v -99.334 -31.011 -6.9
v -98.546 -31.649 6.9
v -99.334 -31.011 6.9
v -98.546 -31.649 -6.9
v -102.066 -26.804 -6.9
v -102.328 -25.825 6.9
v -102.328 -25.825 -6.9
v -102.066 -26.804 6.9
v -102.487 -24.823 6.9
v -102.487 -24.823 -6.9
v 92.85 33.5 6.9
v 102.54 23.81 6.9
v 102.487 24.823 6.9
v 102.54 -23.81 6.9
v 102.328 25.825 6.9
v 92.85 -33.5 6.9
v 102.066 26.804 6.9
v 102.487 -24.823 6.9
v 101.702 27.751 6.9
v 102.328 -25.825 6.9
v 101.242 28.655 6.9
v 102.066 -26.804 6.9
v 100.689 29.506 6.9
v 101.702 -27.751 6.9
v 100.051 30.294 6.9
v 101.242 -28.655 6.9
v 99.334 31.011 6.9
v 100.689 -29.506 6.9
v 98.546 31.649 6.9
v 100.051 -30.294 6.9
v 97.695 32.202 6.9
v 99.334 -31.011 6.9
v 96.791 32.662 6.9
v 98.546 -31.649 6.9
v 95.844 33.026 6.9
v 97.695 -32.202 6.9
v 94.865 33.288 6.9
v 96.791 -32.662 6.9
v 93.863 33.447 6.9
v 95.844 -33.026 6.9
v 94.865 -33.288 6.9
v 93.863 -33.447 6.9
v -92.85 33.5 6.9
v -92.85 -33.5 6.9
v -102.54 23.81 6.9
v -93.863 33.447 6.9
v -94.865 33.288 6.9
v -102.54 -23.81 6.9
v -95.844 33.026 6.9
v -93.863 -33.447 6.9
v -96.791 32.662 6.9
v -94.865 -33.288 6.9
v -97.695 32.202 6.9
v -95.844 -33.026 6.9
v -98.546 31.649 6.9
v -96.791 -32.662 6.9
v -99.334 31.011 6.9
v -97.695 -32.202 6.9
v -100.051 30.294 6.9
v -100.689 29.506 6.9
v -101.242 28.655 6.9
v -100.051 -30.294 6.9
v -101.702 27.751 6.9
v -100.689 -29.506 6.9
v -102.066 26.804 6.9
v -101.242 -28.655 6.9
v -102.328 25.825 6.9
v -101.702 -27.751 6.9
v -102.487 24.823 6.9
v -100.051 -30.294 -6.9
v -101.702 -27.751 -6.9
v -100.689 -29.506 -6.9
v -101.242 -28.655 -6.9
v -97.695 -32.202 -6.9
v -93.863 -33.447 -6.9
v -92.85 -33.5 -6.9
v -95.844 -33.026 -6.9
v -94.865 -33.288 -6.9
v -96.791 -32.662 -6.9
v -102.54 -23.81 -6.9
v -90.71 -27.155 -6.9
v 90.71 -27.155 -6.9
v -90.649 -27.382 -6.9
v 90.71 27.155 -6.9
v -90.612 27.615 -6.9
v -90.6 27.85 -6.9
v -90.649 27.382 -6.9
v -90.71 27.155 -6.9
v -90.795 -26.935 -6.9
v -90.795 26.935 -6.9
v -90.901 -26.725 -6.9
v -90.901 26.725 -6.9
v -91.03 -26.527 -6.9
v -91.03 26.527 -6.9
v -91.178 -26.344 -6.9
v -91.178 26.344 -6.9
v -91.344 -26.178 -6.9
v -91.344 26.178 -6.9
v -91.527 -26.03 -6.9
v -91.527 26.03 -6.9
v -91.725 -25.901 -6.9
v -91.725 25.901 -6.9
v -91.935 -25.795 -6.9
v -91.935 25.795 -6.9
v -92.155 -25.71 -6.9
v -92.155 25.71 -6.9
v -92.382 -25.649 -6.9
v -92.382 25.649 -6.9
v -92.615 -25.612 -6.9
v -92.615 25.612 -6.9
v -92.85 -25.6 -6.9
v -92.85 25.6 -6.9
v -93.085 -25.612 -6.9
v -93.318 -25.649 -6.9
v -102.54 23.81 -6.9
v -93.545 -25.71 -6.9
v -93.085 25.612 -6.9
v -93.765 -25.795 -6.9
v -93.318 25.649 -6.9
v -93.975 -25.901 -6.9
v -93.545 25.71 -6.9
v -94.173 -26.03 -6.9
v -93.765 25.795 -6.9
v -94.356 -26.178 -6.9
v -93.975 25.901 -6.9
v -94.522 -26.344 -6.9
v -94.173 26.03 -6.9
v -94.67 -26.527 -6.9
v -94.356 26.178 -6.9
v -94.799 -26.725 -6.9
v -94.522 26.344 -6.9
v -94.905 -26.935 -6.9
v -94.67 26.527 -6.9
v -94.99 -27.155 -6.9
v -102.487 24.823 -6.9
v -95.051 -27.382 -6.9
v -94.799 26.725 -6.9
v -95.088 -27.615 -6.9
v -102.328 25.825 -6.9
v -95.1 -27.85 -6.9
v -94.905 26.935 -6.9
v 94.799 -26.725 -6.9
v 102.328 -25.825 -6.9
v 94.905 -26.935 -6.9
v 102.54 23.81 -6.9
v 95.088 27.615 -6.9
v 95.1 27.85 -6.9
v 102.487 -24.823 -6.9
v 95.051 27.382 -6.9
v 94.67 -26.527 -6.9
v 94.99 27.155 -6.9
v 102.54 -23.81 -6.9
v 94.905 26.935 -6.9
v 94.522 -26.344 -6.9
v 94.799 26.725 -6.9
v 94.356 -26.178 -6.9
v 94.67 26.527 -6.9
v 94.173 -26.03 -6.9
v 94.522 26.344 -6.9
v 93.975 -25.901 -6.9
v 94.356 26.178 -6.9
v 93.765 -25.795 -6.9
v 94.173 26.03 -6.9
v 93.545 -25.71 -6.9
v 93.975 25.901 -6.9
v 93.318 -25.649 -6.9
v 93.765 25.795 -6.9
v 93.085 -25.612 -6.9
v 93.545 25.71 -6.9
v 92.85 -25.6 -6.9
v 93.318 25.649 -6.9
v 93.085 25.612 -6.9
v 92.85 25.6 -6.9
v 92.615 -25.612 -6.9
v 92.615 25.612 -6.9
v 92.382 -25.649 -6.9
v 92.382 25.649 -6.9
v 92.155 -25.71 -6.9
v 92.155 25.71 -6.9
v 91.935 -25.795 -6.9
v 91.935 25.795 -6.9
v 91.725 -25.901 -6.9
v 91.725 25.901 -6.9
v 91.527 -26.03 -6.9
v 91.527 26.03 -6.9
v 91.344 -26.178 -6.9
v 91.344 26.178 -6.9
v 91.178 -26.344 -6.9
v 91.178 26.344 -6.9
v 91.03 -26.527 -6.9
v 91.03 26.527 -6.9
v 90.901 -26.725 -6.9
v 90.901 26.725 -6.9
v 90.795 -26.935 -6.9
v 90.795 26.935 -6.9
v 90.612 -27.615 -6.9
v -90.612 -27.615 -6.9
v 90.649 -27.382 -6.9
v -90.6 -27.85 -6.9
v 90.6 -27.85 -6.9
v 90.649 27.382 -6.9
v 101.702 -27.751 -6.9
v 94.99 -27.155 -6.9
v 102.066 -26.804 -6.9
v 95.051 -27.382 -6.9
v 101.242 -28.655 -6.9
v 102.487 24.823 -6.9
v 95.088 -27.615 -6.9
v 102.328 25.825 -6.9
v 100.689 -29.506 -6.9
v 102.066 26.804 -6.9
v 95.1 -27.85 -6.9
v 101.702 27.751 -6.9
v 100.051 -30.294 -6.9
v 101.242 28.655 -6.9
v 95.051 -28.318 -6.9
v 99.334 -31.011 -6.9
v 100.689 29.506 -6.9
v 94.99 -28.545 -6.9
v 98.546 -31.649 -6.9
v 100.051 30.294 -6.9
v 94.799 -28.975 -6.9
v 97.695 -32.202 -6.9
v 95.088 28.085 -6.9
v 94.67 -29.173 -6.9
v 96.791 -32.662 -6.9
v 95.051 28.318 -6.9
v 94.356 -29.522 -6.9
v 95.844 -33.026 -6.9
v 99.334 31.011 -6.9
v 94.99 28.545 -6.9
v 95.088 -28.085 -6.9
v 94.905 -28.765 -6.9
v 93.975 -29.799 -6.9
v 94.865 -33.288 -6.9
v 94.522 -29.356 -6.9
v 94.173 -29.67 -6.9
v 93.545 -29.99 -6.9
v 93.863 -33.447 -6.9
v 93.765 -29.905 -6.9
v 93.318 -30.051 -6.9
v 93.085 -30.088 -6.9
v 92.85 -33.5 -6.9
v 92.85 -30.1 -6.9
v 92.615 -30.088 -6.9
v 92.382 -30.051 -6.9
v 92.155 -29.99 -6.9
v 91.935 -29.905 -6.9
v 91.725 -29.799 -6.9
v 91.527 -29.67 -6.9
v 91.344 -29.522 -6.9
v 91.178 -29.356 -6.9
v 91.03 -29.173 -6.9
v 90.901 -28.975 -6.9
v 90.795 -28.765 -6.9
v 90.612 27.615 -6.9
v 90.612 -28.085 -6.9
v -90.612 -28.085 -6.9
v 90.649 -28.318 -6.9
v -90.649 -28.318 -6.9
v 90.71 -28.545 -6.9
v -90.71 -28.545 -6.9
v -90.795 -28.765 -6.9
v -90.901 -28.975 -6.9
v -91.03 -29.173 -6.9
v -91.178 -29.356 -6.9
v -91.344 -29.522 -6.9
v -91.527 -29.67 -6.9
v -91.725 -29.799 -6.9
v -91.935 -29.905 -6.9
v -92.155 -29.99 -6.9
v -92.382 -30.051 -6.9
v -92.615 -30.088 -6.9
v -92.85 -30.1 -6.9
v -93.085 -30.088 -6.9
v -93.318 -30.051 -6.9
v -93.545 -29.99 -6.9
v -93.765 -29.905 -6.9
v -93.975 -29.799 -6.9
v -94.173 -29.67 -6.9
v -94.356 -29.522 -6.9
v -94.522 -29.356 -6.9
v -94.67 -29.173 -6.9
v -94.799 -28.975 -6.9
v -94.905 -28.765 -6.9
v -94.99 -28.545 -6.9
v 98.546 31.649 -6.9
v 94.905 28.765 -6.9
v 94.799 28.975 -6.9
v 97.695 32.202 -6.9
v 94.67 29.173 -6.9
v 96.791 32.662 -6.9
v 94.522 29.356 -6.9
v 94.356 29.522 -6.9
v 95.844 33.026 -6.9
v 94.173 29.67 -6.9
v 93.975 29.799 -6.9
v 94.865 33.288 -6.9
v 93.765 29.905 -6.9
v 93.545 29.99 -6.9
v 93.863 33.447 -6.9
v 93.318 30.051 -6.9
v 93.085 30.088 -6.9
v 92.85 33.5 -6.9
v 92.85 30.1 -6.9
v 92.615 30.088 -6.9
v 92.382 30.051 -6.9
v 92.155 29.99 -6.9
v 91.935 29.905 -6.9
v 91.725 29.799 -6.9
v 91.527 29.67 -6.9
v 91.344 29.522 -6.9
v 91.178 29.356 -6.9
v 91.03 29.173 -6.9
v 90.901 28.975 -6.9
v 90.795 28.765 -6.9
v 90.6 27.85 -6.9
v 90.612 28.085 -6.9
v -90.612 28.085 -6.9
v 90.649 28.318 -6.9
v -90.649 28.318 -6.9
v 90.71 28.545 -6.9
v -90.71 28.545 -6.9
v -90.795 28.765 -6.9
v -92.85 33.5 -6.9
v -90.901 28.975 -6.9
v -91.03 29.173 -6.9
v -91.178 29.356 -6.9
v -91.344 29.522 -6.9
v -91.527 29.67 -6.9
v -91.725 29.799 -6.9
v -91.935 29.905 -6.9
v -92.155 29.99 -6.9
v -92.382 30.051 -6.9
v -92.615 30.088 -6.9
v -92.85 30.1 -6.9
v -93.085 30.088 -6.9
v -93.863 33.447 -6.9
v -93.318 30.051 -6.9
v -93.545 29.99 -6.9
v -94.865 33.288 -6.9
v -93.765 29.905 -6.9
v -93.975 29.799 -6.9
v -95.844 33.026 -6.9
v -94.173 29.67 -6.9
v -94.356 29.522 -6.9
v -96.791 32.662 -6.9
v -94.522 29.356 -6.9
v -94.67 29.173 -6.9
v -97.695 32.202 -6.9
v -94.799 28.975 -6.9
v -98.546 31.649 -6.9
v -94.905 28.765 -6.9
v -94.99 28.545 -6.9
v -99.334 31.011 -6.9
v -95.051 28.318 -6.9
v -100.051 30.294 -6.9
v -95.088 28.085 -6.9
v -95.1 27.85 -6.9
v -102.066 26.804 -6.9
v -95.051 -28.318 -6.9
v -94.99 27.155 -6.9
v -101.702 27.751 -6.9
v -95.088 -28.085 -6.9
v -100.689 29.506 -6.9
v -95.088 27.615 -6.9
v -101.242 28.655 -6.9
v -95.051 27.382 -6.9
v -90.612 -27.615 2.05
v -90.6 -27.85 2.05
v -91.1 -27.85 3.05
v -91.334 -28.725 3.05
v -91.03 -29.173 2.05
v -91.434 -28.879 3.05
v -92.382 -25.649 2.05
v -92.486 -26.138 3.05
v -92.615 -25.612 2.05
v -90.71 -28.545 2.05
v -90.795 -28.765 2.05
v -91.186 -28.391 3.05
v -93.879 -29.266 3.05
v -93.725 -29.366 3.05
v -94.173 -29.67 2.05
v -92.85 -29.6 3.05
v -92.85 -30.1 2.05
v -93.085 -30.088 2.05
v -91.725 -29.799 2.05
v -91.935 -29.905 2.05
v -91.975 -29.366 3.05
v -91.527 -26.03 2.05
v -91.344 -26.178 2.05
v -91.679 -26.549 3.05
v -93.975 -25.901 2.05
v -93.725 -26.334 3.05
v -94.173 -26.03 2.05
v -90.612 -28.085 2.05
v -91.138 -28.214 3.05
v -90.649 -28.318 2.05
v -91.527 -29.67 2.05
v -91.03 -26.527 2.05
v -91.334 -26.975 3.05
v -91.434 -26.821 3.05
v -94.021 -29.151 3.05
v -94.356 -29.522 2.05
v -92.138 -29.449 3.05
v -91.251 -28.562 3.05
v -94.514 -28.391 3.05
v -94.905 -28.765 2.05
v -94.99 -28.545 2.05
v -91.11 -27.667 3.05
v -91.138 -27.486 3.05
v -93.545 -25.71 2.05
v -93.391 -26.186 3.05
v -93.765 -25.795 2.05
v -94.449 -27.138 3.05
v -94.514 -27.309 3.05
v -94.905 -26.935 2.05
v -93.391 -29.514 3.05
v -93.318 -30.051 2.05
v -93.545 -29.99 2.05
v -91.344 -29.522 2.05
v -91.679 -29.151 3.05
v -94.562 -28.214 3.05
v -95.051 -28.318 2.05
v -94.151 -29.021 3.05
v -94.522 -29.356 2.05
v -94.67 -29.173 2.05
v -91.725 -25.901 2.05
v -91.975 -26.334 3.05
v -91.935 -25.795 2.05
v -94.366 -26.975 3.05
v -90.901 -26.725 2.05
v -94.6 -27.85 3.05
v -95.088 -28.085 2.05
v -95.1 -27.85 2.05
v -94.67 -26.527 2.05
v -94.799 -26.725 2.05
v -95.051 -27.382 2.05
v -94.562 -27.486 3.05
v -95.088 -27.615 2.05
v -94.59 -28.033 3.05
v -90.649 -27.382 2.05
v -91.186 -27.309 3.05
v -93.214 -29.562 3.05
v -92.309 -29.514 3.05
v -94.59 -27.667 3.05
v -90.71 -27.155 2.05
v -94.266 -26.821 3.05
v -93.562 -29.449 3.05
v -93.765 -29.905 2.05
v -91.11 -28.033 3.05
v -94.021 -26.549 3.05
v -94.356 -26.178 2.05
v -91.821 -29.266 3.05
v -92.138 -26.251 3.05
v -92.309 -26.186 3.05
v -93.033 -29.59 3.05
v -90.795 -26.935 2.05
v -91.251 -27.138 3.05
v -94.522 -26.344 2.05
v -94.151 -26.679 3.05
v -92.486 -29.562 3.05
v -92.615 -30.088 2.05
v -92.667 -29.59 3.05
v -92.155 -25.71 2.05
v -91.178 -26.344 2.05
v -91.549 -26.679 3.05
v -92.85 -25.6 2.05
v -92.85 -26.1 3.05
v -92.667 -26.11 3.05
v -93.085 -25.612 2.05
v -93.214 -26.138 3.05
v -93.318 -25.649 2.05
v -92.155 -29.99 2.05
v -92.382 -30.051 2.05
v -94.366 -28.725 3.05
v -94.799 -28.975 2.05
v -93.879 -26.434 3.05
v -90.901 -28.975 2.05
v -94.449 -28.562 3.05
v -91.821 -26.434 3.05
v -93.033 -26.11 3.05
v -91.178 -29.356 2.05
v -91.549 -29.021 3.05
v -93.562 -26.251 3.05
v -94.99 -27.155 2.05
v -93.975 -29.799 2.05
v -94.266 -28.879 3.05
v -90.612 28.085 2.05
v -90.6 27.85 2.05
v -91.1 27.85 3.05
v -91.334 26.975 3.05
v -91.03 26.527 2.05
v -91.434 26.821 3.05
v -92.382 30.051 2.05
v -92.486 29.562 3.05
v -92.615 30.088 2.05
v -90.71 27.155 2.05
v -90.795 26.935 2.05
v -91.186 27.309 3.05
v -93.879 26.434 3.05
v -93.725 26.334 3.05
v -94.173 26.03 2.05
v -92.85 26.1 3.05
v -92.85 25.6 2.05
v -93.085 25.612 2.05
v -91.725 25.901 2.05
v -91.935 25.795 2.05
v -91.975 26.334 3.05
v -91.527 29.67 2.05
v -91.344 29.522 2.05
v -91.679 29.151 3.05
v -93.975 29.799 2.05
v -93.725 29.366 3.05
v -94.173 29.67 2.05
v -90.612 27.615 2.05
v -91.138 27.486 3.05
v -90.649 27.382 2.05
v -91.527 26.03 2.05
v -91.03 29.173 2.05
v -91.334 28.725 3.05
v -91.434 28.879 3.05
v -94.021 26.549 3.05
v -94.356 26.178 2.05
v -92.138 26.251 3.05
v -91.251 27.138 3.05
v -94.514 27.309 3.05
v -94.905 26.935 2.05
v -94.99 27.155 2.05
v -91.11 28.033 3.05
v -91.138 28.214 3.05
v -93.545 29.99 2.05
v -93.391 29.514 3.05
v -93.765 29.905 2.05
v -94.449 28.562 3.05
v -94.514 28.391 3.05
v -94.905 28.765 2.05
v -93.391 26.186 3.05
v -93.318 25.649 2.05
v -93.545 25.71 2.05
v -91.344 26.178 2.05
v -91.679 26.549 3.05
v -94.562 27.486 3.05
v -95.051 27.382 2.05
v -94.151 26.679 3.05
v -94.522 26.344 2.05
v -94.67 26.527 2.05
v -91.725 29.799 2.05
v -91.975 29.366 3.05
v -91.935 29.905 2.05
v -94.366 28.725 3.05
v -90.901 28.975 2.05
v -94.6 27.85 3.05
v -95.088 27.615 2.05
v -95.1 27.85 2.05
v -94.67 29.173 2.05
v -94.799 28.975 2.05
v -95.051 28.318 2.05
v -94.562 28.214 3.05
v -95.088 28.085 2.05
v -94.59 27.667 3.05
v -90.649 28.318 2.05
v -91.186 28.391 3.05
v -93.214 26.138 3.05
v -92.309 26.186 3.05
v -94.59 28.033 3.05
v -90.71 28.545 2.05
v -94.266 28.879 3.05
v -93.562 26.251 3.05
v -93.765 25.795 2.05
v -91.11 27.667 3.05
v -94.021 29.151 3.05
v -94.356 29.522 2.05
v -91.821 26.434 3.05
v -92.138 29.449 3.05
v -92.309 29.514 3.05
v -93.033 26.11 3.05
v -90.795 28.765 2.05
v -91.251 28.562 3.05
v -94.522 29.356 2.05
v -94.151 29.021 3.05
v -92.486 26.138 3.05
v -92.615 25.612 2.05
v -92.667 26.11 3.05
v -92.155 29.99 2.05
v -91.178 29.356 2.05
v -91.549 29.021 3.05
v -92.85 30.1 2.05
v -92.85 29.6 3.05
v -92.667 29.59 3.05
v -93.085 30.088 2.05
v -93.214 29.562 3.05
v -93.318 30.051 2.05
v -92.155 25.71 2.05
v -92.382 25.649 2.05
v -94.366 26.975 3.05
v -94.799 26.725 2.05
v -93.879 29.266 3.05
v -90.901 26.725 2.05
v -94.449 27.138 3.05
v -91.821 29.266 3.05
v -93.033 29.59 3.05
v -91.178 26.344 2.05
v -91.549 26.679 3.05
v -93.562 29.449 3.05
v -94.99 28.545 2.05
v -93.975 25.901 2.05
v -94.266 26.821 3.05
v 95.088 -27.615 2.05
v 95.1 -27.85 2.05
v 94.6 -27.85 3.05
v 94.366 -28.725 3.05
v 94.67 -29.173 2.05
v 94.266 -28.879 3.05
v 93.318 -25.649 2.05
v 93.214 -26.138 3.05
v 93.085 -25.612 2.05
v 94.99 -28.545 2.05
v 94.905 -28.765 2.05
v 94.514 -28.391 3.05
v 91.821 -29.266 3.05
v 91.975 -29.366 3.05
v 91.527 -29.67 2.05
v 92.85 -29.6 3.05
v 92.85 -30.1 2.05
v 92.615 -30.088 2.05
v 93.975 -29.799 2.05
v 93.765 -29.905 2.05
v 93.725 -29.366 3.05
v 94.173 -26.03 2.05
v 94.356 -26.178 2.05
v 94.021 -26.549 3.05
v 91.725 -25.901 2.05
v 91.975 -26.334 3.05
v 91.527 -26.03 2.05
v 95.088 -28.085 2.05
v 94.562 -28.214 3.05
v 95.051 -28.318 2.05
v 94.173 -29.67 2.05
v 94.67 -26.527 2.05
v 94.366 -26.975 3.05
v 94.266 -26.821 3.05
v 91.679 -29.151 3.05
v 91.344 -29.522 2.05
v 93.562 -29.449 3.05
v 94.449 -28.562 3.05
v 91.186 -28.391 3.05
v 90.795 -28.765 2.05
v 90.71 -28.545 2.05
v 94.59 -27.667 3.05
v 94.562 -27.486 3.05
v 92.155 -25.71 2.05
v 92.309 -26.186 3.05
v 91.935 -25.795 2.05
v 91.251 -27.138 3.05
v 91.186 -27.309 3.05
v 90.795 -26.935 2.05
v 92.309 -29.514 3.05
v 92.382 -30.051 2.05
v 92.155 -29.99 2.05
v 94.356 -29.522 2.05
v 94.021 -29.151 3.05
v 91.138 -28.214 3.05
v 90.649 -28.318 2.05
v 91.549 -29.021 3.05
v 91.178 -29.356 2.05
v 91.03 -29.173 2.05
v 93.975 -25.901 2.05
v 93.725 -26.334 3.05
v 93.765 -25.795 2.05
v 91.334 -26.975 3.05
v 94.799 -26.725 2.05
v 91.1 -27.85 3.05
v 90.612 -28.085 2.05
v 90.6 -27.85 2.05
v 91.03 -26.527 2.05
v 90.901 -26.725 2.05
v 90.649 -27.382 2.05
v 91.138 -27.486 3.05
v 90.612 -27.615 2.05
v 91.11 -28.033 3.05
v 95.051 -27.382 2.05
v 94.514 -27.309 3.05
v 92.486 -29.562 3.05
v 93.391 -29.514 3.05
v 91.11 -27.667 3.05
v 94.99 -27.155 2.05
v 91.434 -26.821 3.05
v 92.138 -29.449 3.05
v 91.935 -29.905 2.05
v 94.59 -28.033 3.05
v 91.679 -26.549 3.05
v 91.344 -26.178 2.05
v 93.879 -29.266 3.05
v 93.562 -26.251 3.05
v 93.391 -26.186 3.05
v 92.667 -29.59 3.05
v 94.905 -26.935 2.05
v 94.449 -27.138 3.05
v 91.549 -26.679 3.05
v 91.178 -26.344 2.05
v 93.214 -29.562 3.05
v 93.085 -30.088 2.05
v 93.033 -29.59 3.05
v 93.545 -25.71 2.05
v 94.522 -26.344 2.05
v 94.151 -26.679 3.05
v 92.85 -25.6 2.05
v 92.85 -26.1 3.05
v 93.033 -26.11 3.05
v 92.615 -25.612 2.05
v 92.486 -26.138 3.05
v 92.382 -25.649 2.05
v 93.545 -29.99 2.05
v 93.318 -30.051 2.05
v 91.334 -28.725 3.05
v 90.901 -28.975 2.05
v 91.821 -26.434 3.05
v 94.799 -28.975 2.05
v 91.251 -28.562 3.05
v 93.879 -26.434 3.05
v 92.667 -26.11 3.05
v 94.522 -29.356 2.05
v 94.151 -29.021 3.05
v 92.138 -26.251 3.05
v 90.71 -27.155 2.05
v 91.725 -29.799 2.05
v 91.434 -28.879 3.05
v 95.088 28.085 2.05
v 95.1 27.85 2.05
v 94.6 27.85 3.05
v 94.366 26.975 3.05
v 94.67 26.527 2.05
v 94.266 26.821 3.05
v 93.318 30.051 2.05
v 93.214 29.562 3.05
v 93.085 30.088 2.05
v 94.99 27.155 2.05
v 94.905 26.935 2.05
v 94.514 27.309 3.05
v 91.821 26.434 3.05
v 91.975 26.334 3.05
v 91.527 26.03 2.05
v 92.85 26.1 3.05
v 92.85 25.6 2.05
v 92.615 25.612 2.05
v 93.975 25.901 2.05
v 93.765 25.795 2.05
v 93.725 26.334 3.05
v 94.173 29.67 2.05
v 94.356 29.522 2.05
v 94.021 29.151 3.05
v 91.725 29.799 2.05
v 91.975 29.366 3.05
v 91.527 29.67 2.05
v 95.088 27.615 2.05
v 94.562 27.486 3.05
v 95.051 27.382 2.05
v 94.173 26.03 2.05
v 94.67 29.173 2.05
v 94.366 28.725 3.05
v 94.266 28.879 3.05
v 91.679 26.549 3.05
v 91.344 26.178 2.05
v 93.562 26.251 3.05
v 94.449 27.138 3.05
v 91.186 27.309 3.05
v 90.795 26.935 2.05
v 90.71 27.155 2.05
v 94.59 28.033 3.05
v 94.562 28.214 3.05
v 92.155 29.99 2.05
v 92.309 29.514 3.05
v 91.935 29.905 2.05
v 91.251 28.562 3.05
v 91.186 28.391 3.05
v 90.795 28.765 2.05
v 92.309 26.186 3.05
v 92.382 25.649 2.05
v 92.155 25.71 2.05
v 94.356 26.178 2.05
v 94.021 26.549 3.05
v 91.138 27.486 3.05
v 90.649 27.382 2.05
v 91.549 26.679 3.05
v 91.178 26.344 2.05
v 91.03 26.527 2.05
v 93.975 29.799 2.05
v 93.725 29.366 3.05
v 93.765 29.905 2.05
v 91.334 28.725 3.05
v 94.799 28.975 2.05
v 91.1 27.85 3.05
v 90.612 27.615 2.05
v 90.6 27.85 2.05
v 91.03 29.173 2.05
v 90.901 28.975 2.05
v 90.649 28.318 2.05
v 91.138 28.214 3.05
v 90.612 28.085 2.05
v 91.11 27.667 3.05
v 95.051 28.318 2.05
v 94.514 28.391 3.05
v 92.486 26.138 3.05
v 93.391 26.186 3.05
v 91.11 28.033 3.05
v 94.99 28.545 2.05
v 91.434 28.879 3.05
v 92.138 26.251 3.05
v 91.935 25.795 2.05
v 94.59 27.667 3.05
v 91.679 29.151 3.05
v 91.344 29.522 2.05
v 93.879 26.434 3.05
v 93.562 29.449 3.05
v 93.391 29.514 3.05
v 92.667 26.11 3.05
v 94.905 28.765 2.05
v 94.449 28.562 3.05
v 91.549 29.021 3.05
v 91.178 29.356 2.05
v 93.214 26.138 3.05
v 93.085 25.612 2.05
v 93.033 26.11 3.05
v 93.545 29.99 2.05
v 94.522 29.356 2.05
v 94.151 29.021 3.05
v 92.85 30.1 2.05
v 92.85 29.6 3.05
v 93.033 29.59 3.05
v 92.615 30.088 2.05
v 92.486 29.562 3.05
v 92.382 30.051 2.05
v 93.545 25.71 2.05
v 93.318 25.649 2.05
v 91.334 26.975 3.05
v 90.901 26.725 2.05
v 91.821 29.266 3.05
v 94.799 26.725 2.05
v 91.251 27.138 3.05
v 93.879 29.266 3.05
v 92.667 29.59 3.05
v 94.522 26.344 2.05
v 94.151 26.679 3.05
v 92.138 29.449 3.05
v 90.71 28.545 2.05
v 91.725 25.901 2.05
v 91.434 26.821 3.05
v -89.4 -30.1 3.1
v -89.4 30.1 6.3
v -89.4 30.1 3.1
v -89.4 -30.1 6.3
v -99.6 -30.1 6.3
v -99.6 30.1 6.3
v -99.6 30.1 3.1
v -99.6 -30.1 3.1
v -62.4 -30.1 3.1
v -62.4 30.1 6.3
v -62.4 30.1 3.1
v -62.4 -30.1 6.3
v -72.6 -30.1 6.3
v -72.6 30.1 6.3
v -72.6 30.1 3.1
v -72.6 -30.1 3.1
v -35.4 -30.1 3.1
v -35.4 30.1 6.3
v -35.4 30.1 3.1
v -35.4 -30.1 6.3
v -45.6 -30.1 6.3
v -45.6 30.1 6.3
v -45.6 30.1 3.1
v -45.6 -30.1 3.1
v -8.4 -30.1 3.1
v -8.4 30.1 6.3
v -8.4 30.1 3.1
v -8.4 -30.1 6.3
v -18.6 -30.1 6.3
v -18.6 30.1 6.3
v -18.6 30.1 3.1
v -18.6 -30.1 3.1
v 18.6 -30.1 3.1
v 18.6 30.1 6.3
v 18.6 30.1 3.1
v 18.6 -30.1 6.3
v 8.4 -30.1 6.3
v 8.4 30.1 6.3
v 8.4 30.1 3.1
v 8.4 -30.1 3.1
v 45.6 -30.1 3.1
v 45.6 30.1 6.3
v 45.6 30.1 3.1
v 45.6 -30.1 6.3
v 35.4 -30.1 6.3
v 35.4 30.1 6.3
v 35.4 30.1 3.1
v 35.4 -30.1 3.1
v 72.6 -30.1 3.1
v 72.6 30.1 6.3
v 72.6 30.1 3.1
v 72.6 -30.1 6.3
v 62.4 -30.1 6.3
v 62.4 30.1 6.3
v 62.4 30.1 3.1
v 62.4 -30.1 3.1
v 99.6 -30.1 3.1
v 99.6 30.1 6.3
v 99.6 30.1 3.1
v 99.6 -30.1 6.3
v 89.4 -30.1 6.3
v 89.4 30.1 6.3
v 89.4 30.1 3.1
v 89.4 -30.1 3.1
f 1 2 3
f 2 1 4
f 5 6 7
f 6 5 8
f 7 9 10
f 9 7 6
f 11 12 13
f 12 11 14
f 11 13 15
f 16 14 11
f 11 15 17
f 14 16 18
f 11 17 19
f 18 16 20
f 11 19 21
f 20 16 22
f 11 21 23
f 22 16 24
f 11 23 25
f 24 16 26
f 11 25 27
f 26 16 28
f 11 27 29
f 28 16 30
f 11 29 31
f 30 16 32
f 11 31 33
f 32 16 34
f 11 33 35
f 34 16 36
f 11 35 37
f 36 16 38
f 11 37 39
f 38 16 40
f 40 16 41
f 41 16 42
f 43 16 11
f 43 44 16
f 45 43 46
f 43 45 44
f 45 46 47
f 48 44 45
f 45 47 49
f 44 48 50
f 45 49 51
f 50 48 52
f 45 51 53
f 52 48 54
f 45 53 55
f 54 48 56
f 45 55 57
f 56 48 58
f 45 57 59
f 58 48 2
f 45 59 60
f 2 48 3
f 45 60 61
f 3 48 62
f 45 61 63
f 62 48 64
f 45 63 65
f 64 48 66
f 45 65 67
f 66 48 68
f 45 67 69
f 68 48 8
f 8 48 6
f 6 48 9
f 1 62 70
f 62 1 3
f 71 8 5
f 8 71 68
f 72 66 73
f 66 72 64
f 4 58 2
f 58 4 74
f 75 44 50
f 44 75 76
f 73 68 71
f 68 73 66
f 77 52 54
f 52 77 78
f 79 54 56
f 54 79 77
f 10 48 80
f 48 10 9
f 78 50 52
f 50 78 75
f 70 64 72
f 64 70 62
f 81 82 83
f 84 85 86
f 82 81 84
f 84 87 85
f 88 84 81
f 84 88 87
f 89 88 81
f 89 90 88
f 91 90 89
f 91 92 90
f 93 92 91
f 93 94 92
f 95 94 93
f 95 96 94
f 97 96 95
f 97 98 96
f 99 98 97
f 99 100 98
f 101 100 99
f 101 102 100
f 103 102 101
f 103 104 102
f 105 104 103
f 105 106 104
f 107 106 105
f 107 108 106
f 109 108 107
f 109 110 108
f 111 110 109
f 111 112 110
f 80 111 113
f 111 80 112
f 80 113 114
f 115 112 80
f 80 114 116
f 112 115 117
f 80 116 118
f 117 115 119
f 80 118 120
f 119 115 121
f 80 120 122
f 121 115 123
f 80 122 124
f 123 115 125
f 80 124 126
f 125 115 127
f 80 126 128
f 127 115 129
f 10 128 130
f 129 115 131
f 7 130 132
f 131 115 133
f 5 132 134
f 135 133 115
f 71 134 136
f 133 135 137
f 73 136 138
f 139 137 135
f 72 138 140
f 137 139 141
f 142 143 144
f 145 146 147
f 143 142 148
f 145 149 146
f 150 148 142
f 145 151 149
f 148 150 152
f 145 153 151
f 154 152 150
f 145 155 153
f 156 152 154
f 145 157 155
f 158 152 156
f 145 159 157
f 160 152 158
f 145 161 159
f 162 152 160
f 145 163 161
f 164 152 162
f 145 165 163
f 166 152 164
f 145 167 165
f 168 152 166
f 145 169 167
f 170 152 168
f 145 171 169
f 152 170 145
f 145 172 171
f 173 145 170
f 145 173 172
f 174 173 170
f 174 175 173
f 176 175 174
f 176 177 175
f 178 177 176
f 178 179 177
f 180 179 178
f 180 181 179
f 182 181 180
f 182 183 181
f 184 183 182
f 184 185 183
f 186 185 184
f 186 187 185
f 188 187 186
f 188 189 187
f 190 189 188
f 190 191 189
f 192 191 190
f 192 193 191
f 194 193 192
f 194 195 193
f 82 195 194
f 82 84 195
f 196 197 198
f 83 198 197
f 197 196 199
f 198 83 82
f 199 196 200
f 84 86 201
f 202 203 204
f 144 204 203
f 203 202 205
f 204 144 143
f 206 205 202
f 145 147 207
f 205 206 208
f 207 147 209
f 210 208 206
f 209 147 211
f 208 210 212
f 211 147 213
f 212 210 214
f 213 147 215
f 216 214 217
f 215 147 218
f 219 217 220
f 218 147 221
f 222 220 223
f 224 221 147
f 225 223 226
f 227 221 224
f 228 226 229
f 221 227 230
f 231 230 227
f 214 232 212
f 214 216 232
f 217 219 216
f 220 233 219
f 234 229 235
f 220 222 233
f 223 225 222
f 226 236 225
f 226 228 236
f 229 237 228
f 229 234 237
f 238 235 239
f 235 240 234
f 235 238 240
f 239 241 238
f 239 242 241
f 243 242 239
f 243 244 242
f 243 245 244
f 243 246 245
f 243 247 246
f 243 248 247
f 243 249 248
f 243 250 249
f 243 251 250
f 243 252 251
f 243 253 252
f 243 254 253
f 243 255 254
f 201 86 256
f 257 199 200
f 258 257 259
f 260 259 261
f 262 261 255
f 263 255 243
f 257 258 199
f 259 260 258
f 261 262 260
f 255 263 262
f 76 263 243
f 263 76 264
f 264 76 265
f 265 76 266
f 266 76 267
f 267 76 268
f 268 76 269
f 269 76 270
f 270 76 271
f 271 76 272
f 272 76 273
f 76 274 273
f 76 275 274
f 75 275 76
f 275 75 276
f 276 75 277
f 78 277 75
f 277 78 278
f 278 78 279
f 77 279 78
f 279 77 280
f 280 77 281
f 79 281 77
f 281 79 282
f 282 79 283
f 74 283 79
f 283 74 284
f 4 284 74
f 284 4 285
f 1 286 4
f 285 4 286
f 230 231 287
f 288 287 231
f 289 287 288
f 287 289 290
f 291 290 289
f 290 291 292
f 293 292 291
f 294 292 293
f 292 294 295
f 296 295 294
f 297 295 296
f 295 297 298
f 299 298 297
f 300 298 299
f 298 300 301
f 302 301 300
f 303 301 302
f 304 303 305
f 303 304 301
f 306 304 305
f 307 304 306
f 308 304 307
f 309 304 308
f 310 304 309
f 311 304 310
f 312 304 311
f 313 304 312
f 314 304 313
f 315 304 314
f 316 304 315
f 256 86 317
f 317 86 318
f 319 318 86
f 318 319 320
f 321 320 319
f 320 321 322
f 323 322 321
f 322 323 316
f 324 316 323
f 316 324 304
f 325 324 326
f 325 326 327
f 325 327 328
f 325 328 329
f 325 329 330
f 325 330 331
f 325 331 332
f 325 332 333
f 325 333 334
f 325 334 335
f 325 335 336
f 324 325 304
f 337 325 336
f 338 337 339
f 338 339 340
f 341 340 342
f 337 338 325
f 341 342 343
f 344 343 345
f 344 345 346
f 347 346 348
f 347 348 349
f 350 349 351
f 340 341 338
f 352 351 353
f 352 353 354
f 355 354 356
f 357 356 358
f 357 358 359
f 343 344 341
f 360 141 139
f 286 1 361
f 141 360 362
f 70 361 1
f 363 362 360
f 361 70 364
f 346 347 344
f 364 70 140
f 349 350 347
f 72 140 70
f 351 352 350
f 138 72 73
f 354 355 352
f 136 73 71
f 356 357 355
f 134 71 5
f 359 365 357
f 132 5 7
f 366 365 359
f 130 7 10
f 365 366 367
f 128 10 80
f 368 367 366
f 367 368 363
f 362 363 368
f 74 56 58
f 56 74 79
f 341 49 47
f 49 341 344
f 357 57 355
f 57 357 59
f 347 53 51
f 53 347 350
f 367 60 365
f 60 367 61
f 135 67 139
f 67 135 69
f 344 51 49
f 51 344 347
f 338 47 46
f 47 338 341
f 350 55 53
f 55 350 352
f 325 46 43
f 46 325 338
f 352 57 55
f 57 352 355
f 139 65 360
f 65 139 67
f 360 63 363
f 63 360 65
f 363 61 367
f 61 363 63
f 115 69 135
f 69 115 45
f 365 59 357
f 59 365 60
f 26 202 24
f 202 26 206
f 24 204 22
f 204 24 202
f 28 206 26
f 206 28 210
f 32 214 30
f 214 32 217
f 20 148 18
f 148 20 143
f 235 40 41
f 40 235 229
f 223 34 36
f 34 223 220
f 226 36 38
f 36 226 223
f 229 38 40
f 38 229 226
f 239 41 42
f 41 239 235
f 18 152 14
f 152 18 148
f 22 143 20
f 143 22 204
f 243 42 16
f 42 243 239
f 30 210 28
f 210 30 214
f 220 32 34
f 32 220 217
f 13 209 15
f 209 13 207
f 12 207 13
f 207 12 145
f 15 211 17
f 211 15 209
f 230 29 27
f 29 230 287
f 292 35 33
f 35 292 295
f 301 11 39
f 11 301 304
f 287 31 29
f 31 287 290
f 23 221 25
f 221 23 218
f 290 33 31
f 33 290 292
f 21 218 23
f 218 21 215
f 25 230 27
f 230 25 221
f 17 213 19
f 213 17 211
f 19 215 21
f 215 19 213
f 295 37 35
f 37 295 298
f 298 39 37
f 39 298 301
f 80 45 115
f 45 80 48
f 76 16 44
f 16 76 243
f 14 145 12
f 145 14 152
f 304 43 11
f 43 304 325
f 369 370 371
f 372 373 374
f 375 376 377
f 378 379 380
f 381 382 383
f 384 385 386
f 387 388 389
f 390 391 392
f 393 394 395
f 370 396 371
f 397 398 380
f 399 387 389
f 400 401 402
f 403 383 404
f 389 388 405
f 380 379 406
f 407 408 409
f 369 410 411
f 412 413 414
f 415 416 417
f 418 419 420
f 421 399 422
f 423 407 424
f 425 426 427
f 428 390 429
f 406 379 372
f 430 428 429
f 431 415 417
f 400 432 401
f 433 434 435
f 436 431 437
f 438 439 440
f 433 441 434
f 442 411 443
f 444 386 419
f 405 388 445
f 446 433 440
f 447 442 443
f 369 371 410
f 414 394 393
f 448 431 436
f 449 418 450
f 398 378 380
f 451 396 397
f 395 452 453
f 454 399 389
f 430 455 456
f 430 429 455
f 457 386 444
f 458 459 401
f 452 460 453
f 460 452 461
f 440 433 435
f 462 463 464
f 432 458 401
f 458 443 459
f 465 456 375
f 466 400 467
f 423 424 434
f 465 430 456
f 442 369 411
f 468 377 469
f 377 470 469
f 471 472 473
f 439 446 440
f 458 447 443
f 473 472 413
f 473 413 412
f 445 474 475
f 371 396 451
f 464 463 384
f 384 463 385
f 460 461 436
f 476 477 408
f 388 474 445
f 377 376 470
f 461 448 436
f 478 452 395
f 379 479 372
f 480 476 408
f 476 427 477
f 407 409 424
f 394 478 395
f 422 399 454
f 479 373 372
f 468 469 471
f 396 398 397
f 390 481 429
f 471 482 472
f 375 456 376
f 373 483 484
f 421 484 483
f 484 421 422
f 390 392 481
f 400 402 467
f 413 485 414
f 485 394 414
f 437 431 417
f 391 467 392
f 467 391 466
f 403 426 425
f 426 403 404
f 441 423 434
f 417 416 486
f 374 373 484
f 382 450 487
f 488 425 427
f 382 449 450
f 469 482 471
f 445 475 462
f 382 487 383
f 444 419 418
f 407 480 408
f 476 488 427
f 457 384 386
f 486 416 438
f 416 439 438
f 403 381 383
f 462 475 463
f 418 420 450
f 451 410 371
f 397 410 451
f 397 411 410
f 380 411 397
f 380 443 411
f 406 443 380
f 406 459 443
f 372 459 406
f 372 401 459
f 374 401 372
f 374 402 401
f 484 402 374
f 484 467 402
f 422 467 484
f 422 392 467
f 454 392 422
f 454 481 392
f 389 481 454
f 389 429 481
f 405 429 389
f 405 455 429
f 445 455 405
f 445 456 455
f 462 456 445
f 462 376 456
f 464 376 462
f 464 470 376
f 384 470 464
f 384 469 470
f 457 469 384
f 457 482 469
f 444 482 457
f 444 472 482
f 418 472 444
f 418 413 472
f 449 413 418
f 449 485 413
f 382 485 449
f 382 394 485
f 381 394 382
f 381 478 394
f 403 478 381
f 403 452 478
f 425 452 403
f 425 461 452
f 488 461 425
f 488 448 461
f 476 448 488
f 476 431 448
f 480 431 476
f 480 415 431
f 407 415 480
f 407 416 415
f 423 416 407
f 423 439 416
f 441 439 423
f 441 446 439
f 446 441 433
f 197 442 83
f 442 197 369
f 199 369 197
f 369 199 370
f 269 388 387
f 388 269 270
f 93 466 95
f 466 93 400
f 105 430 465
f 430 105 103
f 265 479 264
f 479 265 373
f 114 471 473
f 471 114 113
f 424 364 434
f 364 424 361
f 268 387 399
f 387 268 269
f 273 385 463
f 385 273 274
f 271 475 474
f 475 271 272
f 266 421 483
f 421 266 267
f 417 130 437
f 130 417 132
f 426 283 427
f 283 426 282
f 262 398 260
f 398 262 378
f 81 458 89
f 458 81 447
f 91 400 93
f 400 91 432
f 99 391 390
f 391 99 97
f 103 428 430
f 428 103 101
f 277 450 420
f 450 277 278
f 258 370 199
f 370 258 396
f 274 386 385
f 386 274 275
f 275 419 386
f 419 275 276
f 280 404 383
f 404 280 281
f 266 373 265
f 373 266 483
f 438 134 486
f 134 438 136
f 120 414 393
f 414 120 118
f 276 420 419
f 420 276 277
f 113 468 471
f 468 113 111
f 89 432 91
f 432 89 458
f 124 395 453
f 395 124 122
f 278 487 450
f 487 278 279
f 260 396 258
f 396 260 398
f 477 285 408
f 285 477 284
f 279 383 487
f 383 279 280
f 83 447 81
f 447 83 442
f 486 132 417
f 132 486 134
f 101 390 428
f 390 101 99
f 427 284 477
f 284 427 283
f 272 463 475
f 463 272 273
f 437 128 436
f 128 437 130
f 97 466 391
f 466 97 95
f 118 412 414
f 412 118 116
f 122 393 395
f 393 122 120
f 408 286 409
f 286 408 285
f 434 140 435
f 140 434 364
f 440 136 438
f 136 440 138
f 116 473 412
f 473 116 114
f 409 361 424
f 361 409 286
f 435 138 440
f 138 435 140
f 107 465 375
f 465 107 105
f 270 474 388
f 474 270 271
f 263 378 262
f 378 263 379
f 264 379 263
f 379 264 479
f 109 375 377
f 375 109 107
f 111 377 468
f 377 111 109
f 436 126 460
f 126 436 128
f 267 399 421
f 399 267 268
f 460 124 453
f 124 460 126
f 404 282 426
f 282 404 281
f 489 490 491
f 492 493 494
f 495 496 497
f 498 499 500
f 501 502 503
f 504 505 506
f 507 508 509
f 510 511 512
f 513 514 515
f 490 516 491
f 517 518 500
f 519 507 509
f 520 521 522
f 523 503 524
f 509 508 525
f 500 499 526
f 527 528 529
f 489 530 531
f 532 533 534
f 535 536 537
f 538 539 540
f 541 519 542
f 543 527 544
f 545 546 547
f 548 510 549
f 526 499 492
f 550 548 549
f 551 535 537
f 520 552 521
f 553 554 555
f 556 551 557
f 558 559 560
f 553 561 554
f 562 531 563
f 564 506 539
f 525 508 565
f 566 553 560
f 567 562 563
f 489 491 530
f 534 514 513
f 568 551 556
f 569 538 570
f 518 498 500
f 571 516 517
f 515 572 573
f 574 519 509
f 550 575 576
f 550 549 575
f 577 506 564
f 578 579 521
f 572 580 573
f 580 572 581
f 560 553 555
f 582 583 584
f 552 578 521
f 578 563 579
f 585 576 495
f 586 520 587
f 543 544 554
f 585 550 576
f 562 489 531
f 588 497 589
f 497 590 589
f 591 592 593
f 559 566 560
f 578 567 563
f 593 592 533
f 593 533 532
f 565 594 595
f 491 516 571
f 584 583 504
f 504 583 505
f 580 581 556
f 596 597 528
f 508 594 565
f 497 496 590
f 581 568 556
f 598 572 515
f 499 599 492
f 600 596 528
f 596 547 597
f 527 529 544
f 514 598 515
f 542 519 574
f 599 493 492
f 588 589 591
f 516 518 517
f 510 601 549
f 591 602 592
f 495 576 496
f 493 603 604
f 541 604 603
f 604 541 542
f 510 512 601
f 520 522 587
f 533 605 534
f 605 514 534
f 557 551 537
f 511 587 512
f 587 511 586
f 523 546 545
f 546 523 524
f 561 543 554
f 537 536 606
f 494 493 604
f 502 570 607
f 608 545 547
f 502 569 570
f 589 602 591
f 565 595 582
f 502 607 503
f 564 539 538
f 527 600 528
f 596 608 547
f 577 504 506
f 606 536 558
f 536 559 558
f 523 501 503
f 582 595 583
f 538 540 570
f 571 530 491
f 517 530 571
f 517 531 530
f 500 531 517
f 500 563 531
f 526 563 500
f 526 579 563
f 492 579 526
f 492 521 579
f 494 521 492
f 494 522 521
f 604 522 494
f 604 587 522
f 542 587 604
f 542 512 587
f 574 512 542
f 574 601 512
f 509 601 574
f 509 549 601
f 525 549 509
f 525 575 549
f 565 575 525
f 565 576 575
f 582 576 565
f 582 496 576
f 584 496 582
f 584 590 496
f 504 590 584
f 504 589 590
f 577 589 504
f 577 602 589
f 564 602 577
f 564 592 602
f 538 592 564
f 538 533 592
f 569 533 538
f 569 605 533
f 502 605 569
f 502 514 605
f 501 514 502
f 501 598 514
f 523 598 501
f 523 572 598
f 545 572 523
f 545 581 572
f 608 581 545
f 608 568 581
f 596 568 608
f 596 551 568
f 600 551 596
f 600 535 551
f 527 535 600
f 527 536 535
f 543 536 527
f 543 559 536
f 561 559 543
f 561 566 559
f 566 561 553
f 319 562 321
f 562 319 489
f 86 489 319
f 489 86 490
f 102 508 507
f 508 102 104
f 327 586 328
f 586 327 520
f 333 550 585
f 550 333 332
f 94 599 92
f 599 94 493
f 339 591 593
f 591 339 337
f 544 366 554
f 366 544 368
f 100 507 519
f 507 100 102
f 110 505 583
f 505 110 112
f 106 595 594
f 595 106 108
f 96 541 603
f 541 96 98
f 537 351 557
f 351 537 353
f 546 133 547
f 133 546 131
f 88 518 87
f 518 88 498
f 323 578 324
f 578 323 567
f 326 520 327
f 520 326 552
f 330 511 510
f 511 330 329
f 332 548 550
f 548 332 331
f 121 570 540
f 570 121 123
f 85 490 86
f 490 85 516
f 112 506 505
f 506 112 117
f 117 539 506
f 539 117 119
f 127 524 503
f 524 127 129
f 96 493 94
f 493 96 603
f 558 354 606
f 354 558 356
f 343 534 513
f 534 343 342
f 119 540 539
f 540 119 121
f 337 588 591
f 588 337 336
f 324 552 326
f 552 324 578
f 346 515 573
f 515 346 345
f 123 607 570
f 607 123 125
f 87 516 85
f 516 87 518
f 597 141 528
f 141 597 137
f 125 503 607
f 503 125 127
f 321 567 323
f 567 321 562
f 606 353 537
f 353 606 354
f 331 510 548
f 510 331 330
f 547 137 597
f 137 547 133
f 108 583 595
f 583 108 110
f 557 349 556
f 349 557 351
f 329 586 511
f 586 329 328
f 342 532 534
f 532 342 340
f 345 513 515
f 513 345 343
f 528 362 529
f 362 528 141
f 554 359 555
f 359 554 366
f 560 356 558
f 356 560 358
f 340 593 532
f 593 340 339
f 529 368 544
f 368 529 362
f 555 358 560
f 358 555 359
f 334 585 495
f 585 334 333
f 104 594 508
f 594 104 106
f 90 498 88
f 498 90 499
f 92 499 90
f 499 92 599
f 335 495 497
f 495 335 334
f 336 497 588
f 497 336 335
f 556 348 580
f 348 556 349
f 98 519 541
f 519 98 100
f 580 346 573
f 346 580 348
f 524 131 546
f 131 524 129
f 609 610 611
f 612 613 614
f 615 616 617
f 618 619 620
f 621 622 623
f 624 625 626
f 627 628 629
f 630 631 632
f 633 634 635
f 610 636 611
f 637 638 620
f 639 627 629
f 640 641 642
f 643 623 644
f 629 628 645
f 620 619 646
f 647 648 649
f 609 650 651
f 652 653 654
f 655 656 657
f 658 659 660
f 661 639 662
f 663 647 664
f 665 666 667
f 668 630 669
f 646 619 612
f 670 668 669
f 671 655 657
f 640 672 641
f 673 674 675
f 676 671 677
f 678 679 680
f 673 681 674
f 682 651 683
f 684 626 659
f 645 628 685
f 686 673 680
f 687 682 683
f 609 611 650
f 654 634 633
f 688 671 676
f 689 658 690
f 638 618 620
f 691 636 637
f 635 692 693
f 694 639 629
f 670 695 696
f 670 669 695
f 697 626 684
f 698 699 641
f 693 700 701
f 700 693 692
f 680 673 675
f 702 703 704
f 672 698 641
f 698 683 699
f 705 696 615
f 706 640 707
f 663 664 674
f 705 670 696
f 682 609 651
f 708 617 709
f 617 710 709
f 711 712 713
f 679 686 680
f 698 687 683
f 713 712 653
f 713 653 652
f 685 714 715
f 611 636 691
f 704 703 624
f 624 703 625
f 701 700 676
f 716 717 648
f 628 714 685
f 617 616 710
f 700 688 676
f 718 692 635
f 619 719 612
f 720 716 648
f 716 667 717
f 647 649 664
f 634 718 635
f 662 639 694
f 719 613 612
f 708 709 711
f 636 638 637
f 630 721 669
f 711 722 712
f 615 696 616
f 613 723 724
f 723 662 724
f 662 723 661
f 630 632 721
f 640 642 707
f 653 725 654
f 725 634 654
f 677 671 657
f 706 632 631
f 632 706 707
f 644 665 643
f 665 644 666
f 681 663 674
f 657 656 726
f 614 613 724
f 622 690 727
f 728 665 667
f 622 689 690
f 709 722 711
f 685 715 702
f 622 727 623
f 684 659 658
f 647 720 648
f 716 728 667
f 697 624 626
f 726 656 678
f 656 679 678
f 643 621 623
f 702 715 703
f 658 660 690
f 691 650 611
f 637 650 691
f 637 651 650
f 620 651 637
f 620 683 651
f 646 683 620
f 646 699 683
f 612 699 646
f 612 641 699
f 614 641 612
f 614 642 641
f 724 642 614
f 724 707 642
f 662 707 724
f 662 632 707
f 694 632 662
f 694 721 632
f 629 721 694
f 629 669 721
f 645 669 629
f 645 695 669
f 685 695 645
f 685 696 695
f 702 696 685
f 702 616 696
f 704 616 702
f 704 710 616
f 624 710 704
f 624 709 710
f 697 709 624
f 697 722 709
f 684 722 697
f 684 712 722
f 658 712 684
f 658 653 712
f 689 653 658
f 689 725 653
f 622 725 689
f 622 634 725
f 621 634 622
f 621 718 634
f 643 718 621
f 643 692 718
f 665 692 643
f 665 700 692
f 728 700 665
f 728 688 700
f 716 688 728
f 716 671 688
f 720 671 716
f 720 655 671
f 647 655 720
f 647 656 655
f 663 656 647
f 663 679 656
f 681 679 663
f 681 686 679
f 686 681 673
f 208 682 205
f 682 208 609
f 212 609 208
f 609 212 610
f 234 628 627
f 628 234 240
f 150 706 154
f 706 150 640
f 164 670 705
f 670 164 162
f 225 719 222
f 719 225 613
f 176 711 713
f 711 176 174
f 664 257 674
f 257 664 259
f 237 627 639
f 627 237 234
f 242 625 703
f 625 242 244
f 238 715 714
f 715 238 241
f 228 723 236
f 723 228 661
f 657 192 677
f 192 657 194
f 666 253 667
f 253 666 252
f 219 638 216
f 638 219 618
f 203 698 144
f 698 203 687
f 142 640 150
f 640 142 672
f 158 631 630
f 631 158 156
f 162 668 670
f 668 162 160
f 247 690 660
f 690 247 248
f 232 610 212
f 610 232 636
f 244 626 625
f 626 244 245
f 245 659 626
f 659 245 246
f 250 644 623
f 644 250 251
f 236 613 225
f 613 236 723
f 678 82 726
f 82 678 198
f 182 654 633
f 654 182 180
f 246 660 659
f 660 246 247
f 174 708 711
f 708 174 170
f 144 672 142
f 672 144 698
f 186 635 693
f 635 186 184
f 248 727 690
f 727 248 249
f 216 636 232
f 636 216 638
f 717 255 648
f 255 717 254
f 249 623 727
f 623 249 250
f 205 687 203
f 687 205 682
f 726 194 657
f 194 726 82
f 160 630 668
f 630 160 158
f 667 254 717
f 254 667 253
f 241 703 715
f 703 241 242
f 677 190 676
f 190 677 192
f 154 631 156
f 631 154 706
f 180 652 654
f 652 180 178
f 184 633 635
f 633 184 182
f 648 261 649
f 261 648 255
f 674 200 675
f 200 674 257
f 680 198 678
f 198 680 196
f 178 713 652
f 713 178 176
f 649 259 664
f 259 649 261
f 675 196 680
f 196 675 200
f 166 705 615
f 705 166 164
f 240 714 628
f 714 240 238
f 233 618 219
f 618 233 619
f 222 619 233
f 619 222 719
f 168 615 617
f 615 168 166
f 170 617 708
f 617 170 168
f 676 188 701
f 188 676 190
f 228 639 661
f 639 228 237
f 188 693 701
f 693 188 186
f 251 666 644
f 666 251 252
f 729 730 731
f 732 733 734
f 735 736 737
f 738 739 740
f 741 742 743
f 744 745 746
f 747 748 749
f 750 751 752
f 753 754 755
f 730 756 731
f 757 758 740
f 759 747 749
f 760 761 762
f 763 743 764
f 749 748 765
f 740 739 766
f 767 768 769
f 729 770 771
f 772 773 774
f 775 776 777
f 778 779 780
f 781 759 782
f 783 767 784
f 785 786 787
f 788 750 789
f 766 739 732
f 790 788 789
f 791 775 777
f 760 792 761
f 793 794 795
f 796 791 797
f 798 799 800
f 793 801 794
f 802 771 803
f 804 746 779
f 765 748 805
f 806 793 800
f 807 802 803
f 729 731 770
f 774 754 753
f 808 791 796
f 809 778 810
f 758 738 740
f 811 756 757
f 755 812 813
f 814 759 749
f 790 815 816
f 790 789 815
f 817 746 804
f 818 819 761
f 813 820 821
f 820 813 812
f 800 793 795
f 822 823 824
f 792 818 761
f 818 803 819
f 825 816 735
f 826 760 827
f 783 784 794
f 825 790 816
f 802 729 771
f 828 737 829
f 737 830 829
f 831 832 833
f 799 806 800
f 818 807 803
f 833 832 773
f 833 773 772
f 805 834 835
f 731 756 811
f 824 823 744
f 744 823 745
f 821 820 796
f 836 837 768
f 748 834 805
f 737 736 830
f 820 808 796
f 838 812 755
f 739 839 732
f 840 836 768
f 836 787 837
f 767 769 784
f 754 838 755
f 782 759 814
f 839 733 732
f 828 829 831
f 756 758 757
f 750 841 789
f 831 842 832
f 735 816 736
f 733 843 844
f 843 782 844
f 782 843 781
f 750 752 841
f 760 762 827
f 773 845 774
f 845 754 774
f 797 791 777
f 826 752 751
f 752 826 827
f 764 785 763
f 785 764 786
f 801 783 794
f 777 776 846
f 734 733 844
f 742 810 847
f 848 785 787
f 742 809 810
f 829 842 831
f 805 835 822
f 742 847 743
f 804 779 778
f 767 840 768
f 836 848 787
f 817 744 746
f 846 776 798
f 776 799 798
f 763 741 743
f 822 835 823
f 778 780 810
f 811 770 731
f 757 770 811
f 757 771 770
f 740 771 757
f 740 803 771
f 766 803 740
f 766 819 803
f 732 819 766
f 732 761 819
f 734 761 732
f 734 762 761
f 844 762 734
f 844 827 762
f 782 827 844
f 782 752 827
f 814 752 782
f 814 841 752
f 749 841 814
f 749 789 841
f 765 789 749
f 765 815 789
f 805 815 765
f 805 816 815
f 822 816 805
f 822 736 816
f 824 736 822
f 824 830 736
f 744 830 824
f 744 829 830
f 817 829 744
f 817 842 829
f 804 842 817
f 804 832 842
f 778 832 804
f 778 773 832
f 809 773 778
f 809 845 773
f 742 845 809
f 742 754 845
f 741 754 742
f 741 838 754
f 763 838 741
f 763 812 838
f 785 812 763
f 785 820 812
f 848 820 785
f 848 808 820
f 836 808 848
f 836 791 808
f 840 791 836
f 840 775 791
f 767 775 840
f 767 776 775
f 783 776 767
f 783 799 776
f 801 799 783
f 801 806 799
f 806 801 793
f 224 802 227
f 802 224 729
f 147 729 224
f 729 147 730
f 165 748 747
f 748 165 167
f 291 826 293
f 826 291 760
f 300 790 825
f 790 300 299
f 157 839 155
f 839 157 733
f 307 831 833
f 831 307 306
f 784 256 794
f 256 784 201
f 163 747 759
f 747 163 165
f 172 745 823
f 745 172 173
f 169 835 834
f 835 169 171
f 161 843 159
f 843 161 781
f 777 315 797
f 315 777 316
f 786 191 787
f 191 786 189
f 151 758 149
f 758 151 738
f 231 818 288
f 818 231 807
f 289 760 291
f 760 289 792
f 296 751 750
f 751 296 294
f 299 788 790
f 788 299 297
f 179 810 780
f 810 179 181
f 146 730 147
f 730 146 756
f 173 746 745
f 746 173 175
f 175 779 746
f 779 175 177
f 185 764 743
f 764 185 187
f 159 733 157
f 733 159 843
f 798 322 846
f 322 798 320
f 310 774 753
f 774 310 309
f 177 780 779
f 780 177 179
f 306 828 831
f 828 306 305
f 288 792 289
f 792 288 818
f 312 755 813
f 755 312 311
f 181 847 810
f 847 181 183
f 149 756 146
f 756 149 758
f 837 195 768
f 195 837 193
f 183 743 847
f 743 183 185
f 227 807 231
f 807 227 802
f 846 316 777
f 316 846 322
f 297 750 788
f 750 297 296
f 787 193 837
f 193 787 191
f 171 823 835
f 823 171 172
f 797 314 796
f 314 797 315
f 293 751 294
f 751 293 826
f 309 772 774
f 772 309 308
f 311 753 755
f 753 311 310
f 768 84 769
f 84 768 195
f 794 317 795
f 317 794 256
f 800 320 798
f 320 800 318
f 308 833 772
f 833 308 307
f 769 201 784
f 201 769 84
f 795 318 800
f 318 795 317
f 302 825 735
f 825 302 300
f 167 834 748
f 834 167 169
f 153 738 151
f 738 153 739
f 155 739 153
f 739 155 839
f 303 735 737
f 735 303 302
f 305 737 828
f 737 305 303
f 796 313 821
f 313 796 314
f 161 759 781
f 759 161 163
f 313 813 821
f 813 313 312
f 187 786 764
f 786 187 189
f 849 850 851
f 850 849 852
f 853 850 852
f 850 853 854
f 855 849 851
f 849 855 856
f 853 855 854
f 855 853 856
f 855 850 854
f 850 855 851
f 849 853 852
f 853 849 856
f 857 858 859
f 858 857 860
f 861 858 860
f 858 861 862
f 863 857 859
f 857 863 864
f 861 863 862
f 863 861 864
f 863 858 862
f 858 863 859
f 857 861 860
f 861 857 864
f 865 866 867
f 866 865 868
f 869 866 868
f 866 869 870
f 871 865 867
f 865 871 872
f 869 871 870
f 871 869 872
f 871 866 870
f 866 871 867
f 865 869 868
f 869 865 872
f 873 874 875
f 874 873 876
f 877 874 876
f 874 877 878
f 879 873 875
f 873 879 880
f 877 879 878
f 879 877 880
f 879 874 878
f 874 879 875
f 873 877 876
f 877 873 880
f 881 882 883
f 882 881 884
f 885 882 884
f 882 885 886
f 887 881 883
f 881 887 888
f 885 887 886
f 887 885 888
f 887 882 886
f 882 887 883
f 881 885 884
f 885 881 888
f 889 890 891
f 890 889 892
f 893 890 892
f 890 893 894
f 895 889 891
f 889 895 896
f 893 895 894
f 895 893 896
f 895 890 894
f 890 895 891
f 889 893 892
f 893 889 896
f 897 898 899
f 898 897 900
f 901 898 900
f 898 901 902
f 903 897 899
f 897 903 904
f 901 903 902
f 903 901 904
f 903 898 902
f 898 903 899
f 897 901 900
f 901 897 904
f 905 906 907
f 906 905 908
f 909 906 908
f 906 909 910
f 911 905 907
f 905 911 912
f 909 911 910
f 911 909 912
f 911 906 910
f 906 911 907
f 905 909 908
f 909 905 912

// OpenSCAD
/*
Battlestack - Backplate
Licence: CC-BY-NC-SA
Author: Sergio Moura
Original work by: Twogz
*/

backplate_width = 205.08;
backplate_depth = 67;
backplate_height = 13.8;

border_radius = 9.69;
m3_insert_radius = 4.5/2;
m3_insert_cone_radius = 3.5/2;
m3_insert_cone_height = 1;
m3_insert_height = 9;

m3_insert_distance_y = 3.4;

magnet_width = 10.2;
magnet_height = 3.2;
magnet_depth = 60.2;
magnet_spacing = 27;

magnet_insert_holes = false;

$fn = 60;

m3_insert_border_distance = border_radius / 2;

difference() {
    union() {
        // round corners
        for (x = [-1:2:1]) {
            for (y = [-1:2:1]) {
                translate([
                    x * (backplate_width/2 - border_radius),
                    y * (backplate_depth/2 - border_radius),
                    0
                ])
                cylinder(
                    h = backplate_height,
                    r = border_radius,
                    center = true
                );
            }
        }

        // middle body
        cube(
            [
                backplate_width - border_radius*2,
                backplate_depth - border_radius*2,
                backplate_height
            ],
            center = true
        );

        // edges
        for (y = [-1:2:1]) {
            translate([
                y * (backplate_width - border_radius)/2,
                0,
                0
            ])
            cube(
                [
                    border_radius,
                    backplate_depth - border_radius*2,
                    backplate_height
                ],
                center = true
            );

            translate([0, y * (backplate_depth - border_radius)/2, 0])
            cube(
                [
                    backplate_width - border_radius*2,
                    border_radius,
                    backplate_height
                ],
                center = true
            );
        }
    }
    // m3 insert holes
    for (x = [-1:2:1]) {
        for (y = [-1:2:1]) {
            translate([
                x * (backplate_width/2 - border_radius),
                y * (backplate_depth/2 - m3_insert_radius - m3_insert_distance_y),
                -backplate_height/2 + m3_insert_height/2 - 0.05
            ])
            union() {
                translate([
                    0,
                    0,
                    (m3_insert_height + m3_insert_cone_height)/2
                ])
                cylinder(
                    h = m3_insert_cone_height,
                    r1 = m3_insert_radius,
                    r2 = m3_insert_cone_radius,
                    center = true
                );
                cylinder(
                    h = m3_insert_height,
                    r = m3_insert_radius,
                    center = true
                );
            }
        }
    }
    // magnet spaces
    for (x = [-4:1:3]) {
        translate([
            magnet_spacing/2 + x * magnet_spacing,
            0,
            backplate_height/2-magnet_height/2-0.2*3
        ])
        {
            cube([magnet_width, magnet_depth, magnet_height], center = true);
            if (magnet_insert_holes == true) {
                translate([0, -backplate_depth/2, 0])
                cube([magnet_width, 10, magnet_height], center = true);
            }
        }
    }
}
